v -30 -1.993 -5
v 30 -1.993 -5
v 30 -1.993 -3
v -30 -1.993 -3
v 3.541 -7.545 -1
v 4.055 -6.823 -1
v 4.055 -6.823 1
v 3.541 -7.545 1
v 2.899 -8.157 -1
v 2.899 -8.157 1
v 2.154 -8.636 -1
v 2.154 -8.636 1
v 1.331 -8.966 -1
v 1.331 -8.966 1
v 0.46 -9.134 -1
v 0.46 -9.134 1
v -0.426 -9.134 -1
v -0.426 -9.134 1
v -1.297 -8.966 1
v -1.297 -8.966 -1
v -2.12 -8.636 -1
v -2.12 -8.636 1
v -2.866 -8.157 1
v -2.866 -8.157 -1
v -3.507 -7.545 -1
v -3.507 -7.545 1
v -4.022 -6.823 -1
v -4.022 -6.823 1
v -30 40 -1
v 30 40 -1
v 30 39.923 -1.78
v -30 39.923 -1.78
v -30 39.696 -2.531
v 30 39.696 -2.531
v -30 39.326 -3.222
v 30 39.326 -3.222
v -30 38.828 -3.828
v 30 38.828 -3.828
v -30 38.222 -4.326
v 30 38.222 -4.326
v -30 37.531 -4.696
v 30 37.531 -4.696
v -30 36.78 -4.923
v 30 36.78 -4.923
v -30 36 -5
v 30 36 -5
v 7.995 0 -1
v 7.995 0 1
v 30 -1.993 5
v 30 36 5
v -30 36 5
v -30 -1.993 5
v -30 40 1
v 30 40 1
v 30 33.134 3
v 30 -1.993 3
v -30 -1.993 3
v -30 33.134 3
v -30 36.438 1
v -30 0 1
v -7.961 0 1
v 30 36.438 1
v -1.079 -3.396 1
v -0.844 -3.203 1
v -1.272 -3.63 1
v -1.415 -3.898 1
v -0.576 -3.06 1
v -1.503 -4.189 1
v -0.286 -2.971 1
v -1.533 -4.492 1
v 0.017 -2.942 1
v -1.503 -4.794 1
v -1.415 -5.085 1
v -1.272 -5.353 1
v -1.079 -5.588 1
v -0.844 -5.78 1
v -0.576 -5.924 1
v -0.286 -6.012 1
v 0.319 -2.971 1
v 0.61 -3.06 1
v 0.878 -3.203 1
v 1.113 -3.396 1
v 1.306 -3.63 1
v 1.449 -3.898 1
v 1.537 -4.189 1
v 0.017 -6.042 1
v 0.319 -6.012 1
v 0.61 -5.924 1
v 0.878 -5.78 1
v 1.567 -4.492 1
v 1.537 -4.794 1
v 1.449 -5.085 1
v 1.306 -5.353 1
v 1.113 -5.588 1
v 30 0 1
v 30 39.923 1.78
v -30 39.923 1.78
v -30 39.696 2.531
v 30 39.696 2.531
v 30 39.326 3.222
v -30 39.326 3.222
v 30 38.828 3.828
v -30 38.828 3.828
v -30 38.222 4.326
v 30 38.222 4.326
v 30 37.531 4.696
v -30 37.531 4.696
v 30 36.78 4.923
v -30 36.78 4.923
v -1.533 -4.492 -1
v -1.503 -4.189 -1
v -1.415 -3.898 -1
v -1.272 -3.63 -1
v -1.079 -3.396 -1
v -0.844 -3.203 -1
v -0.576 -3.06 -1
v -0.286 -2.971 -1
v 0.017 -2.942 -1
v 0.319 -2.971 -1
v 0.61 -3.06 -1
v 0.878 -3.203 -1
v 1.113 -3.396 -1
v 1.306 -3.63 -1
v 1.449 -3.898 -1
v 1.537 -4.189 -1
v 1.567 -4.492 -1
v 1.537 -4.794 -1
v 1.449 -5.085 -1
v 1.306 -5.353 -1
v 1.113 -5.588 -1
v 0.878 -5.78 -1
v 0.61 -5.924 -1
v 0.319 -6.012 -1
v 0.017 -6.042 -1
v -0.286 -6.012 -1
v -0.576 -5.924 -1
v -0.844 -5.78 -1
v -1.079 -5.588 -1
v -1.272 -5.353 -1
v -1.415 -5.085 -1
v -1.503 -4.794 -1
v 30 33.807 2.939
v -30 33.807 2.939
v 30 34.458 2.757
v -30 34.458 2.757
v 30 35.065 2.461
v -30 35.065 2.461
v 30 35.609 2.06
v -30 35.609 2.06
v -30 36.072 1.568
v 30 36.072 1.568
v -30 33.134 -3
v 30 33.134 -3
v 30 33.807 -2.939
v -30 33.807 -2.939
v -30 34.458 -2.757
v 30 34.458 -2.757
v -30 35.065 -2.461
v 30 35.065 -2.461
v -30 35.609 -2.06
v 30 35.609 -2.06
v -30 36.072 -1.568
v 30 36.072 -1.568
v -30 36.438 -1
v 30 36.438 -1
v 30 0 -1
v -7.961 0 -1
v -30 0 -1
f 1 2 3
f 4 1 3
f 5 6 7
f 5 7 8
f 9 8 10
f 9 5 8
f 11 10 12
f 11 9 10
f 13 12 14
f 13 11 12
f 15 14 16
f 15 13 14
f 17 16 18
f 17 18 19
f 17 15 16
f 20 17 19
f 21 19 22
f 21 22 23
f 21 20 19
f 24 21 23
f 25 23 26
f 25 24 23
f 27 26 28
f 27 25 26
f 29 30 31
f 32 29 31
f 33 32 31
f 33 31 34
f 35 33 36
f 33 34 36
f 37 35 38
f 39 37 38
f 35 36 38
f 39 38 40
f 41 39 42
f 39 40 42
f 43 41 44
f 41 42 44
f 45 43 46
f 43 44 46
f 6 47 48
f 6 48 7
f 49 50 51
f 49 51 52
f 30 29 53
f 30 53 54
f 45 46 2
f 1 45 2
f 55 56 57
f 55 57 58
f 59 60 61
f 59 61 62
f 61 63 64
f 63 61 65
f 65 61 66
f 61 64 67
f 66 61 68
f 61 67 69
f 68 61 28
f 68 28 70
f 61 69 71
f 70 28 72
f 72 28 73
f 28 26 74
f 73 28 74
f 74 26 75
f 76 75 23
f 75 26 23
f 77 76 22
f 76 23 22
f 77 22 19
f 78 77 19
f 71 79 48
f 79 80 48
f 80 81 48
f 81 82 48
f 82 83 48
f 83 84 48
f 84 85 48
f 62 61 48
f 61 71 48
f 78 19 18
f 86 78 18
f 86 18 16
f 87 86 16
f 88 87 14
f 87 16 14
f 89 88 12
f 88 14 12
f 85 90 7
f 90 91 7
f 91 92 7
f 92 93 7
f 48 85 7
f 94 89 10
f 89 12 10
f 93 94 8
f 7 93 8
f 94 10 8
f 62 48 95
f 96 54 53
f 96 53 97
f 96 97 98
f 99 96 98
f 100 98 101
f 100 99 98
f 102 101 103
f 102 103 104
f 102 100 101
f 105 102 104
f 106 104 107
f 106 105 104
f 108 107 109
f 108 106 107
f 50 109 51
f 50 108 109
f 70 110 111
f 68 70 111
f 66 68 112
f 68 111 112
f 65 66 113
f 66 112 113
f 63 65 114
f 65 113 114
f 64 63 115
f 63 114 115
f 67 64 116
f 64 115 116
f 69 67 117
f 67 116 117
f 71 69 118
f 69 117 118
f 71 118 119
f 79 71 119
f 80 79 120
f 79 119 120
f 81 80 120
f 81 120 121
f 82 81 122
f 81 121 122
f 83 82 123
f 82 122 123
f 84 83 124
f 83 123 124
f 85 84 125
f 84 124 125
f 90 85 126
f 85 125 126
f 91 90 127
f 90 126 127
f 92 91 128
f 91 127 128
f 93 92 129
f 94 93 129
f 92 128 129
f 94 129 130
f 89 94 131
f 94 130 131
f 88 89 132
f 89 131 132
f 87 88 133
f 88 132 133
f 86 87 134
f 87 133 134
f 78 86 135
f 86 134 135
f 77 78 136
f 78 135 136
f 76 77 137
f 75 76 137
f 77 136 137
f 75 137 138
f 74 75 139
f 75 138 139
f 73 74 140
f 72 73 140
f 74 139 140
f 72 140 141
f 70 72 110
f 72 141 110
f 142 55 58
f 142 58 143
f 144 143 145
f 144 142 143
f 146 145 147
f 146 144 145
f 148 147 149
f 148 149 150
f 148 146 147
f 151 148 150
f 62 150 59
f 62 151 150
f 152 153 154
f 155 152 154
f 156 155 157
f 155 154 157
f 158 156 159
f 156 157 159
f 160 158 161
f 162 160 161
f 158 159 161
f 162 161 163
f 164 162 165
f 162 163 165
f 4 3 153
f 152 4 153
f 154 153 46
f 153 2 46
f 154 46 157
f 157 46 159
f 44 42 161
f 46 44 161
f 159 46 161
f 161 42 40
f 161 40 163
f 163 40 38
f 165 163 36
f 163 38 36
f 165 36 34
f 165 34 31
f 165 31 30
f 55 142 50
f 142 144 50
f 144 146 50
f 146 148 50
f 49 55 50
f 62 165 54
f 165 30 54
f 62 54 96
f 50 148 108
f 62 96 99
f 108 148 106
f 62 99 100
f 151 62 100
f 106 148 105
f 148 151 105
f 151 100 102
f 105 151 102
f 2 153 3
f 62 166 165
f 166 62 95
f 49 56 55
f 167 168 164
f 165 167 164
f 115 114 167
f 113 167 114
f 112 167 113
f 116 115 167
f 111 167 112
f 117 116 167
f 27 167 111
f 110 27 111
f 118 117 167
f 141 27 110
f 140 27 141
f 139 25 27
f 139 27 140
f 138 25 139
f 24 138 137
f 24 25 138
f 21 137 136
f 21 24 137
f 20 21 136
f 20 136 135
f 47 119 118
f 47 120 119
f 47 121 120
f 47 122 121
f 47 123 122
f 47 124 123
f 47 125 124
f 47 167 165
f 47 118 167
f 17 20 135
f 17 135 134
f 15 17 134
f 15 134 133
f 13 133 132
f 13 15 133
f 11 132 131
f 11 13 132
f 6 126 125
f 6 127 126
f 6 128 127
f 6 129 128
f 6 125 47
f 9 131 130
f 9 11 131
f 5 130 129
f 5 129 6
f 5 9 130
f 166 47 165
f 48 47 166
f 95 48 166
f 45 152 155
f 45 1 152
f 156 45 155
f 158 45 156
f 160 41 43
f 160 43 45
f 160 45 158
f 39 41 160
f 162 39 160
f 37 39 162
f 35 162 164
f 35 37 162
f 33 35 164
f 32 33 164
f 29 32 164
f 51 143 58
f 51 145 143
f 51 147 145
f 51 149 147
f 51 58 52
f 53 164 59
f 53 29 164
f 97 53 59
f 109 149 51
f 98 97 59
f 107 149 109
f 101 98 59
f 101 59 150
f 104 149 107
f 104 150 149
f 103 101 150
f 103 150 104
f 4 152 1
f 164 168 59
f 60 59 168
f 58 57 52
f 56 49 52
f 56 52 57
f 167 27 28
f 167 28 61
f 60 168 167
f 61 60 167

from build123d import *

# Parameters (mm, degrees)
SKETCH_1_W      = 60
SKETCH_1_H      = 2
EXTRUDE_1_DEPTH = 40
SKETCH_3_R      = 1.55
EXTRUDE_2_DEPTH = 2
EXTRUDE_3_DEPTH = 60


with BuildPart() as part:
    # 草图1 → 凸台-拉伸1 (new body)
    with BuildSketch(Plane(origin=(0, 0, 0), x_dir=(1, 0, 0), z_dir=(0, 1, 0))):
        Rectangle(SKETCH_1_W, SKETCH_1_H)
    extrude(amount=EXTRUDE_1_DEPTH)



with BuildPart() as body_2:
    # 草图3 → 凸台-拉伸2 (new, through all)
    with BuildSketch(Plane(origin=(0, 0, -1), x_dir=(-1, 0, 0), z_dir=(0, 0, -1))):
        with BuildLine():
            Line((-7.994757435, 0), (-4.05536846, -6.823221856))
            ThreePointArc((-4.05536846, -6.823221856), (-0.01683957, -9.154867598), (4.02168932, -6.823221856))
            Line((4.02168932, -6.823221856), (7.961078295, 0))
            Line((7.961078295, 0), (-7.994757435, 0))
        make_face()
        with Locations((-0.01683957, -4.491576114)):
            Circle(SKETCH_3_R, mode=Mode.SUBTRACT)
    extrude(amount=-EXTRUDE_2_DEPTH)


with BuildPart() as part_1:
    add(part.part)

    add(body_2.part)  # 凸台-拉伸3 merges body 2
    # 草图4 → 凸台-拉伸3 (add, through all)
    with BuildSketch(Plane(origin=(30, 0, 0), x_dir=(0, 0, -1), z_dir=(1, 0, 0))):
        with BuildLine():
            Line((5, 36), (5, -1.993440082))
            Line((5, -1.993440082), (3, -1.993440082))
            Line((3, -1.993440082), (3, 33.134423916))
            ThreePointArc((3, 33.134423916), (2.461049161, 35.065394885), (1, 36.43814841))
            Line((1, 36.43814841), (1, 40))
            ThreePointArc((1, 40), (3.828427125, 38.828427125), (5, 36))
        make_face()
        with BuildLine():
            Line((-5, 36), (-5, -1.993440082))
            Line((-5, -1.993440082), (-3, -1.993440082))
            Line((-3, -1.993440082), (-3, 33.134423916))
            ThreePointArc((-3, 33.134423916), (-2.461049161, 35.065394885), (-1, 36.43814841))
            Line((-1, 36.43814841), (-1, 40))
            ThreePointArc((-1, 40), (-3.828427125, 38.828427125), (-5, 36))
        make_face()
    extrude(amount=-EXTRUDE_3_DEPTH)


solid = part_1.part
